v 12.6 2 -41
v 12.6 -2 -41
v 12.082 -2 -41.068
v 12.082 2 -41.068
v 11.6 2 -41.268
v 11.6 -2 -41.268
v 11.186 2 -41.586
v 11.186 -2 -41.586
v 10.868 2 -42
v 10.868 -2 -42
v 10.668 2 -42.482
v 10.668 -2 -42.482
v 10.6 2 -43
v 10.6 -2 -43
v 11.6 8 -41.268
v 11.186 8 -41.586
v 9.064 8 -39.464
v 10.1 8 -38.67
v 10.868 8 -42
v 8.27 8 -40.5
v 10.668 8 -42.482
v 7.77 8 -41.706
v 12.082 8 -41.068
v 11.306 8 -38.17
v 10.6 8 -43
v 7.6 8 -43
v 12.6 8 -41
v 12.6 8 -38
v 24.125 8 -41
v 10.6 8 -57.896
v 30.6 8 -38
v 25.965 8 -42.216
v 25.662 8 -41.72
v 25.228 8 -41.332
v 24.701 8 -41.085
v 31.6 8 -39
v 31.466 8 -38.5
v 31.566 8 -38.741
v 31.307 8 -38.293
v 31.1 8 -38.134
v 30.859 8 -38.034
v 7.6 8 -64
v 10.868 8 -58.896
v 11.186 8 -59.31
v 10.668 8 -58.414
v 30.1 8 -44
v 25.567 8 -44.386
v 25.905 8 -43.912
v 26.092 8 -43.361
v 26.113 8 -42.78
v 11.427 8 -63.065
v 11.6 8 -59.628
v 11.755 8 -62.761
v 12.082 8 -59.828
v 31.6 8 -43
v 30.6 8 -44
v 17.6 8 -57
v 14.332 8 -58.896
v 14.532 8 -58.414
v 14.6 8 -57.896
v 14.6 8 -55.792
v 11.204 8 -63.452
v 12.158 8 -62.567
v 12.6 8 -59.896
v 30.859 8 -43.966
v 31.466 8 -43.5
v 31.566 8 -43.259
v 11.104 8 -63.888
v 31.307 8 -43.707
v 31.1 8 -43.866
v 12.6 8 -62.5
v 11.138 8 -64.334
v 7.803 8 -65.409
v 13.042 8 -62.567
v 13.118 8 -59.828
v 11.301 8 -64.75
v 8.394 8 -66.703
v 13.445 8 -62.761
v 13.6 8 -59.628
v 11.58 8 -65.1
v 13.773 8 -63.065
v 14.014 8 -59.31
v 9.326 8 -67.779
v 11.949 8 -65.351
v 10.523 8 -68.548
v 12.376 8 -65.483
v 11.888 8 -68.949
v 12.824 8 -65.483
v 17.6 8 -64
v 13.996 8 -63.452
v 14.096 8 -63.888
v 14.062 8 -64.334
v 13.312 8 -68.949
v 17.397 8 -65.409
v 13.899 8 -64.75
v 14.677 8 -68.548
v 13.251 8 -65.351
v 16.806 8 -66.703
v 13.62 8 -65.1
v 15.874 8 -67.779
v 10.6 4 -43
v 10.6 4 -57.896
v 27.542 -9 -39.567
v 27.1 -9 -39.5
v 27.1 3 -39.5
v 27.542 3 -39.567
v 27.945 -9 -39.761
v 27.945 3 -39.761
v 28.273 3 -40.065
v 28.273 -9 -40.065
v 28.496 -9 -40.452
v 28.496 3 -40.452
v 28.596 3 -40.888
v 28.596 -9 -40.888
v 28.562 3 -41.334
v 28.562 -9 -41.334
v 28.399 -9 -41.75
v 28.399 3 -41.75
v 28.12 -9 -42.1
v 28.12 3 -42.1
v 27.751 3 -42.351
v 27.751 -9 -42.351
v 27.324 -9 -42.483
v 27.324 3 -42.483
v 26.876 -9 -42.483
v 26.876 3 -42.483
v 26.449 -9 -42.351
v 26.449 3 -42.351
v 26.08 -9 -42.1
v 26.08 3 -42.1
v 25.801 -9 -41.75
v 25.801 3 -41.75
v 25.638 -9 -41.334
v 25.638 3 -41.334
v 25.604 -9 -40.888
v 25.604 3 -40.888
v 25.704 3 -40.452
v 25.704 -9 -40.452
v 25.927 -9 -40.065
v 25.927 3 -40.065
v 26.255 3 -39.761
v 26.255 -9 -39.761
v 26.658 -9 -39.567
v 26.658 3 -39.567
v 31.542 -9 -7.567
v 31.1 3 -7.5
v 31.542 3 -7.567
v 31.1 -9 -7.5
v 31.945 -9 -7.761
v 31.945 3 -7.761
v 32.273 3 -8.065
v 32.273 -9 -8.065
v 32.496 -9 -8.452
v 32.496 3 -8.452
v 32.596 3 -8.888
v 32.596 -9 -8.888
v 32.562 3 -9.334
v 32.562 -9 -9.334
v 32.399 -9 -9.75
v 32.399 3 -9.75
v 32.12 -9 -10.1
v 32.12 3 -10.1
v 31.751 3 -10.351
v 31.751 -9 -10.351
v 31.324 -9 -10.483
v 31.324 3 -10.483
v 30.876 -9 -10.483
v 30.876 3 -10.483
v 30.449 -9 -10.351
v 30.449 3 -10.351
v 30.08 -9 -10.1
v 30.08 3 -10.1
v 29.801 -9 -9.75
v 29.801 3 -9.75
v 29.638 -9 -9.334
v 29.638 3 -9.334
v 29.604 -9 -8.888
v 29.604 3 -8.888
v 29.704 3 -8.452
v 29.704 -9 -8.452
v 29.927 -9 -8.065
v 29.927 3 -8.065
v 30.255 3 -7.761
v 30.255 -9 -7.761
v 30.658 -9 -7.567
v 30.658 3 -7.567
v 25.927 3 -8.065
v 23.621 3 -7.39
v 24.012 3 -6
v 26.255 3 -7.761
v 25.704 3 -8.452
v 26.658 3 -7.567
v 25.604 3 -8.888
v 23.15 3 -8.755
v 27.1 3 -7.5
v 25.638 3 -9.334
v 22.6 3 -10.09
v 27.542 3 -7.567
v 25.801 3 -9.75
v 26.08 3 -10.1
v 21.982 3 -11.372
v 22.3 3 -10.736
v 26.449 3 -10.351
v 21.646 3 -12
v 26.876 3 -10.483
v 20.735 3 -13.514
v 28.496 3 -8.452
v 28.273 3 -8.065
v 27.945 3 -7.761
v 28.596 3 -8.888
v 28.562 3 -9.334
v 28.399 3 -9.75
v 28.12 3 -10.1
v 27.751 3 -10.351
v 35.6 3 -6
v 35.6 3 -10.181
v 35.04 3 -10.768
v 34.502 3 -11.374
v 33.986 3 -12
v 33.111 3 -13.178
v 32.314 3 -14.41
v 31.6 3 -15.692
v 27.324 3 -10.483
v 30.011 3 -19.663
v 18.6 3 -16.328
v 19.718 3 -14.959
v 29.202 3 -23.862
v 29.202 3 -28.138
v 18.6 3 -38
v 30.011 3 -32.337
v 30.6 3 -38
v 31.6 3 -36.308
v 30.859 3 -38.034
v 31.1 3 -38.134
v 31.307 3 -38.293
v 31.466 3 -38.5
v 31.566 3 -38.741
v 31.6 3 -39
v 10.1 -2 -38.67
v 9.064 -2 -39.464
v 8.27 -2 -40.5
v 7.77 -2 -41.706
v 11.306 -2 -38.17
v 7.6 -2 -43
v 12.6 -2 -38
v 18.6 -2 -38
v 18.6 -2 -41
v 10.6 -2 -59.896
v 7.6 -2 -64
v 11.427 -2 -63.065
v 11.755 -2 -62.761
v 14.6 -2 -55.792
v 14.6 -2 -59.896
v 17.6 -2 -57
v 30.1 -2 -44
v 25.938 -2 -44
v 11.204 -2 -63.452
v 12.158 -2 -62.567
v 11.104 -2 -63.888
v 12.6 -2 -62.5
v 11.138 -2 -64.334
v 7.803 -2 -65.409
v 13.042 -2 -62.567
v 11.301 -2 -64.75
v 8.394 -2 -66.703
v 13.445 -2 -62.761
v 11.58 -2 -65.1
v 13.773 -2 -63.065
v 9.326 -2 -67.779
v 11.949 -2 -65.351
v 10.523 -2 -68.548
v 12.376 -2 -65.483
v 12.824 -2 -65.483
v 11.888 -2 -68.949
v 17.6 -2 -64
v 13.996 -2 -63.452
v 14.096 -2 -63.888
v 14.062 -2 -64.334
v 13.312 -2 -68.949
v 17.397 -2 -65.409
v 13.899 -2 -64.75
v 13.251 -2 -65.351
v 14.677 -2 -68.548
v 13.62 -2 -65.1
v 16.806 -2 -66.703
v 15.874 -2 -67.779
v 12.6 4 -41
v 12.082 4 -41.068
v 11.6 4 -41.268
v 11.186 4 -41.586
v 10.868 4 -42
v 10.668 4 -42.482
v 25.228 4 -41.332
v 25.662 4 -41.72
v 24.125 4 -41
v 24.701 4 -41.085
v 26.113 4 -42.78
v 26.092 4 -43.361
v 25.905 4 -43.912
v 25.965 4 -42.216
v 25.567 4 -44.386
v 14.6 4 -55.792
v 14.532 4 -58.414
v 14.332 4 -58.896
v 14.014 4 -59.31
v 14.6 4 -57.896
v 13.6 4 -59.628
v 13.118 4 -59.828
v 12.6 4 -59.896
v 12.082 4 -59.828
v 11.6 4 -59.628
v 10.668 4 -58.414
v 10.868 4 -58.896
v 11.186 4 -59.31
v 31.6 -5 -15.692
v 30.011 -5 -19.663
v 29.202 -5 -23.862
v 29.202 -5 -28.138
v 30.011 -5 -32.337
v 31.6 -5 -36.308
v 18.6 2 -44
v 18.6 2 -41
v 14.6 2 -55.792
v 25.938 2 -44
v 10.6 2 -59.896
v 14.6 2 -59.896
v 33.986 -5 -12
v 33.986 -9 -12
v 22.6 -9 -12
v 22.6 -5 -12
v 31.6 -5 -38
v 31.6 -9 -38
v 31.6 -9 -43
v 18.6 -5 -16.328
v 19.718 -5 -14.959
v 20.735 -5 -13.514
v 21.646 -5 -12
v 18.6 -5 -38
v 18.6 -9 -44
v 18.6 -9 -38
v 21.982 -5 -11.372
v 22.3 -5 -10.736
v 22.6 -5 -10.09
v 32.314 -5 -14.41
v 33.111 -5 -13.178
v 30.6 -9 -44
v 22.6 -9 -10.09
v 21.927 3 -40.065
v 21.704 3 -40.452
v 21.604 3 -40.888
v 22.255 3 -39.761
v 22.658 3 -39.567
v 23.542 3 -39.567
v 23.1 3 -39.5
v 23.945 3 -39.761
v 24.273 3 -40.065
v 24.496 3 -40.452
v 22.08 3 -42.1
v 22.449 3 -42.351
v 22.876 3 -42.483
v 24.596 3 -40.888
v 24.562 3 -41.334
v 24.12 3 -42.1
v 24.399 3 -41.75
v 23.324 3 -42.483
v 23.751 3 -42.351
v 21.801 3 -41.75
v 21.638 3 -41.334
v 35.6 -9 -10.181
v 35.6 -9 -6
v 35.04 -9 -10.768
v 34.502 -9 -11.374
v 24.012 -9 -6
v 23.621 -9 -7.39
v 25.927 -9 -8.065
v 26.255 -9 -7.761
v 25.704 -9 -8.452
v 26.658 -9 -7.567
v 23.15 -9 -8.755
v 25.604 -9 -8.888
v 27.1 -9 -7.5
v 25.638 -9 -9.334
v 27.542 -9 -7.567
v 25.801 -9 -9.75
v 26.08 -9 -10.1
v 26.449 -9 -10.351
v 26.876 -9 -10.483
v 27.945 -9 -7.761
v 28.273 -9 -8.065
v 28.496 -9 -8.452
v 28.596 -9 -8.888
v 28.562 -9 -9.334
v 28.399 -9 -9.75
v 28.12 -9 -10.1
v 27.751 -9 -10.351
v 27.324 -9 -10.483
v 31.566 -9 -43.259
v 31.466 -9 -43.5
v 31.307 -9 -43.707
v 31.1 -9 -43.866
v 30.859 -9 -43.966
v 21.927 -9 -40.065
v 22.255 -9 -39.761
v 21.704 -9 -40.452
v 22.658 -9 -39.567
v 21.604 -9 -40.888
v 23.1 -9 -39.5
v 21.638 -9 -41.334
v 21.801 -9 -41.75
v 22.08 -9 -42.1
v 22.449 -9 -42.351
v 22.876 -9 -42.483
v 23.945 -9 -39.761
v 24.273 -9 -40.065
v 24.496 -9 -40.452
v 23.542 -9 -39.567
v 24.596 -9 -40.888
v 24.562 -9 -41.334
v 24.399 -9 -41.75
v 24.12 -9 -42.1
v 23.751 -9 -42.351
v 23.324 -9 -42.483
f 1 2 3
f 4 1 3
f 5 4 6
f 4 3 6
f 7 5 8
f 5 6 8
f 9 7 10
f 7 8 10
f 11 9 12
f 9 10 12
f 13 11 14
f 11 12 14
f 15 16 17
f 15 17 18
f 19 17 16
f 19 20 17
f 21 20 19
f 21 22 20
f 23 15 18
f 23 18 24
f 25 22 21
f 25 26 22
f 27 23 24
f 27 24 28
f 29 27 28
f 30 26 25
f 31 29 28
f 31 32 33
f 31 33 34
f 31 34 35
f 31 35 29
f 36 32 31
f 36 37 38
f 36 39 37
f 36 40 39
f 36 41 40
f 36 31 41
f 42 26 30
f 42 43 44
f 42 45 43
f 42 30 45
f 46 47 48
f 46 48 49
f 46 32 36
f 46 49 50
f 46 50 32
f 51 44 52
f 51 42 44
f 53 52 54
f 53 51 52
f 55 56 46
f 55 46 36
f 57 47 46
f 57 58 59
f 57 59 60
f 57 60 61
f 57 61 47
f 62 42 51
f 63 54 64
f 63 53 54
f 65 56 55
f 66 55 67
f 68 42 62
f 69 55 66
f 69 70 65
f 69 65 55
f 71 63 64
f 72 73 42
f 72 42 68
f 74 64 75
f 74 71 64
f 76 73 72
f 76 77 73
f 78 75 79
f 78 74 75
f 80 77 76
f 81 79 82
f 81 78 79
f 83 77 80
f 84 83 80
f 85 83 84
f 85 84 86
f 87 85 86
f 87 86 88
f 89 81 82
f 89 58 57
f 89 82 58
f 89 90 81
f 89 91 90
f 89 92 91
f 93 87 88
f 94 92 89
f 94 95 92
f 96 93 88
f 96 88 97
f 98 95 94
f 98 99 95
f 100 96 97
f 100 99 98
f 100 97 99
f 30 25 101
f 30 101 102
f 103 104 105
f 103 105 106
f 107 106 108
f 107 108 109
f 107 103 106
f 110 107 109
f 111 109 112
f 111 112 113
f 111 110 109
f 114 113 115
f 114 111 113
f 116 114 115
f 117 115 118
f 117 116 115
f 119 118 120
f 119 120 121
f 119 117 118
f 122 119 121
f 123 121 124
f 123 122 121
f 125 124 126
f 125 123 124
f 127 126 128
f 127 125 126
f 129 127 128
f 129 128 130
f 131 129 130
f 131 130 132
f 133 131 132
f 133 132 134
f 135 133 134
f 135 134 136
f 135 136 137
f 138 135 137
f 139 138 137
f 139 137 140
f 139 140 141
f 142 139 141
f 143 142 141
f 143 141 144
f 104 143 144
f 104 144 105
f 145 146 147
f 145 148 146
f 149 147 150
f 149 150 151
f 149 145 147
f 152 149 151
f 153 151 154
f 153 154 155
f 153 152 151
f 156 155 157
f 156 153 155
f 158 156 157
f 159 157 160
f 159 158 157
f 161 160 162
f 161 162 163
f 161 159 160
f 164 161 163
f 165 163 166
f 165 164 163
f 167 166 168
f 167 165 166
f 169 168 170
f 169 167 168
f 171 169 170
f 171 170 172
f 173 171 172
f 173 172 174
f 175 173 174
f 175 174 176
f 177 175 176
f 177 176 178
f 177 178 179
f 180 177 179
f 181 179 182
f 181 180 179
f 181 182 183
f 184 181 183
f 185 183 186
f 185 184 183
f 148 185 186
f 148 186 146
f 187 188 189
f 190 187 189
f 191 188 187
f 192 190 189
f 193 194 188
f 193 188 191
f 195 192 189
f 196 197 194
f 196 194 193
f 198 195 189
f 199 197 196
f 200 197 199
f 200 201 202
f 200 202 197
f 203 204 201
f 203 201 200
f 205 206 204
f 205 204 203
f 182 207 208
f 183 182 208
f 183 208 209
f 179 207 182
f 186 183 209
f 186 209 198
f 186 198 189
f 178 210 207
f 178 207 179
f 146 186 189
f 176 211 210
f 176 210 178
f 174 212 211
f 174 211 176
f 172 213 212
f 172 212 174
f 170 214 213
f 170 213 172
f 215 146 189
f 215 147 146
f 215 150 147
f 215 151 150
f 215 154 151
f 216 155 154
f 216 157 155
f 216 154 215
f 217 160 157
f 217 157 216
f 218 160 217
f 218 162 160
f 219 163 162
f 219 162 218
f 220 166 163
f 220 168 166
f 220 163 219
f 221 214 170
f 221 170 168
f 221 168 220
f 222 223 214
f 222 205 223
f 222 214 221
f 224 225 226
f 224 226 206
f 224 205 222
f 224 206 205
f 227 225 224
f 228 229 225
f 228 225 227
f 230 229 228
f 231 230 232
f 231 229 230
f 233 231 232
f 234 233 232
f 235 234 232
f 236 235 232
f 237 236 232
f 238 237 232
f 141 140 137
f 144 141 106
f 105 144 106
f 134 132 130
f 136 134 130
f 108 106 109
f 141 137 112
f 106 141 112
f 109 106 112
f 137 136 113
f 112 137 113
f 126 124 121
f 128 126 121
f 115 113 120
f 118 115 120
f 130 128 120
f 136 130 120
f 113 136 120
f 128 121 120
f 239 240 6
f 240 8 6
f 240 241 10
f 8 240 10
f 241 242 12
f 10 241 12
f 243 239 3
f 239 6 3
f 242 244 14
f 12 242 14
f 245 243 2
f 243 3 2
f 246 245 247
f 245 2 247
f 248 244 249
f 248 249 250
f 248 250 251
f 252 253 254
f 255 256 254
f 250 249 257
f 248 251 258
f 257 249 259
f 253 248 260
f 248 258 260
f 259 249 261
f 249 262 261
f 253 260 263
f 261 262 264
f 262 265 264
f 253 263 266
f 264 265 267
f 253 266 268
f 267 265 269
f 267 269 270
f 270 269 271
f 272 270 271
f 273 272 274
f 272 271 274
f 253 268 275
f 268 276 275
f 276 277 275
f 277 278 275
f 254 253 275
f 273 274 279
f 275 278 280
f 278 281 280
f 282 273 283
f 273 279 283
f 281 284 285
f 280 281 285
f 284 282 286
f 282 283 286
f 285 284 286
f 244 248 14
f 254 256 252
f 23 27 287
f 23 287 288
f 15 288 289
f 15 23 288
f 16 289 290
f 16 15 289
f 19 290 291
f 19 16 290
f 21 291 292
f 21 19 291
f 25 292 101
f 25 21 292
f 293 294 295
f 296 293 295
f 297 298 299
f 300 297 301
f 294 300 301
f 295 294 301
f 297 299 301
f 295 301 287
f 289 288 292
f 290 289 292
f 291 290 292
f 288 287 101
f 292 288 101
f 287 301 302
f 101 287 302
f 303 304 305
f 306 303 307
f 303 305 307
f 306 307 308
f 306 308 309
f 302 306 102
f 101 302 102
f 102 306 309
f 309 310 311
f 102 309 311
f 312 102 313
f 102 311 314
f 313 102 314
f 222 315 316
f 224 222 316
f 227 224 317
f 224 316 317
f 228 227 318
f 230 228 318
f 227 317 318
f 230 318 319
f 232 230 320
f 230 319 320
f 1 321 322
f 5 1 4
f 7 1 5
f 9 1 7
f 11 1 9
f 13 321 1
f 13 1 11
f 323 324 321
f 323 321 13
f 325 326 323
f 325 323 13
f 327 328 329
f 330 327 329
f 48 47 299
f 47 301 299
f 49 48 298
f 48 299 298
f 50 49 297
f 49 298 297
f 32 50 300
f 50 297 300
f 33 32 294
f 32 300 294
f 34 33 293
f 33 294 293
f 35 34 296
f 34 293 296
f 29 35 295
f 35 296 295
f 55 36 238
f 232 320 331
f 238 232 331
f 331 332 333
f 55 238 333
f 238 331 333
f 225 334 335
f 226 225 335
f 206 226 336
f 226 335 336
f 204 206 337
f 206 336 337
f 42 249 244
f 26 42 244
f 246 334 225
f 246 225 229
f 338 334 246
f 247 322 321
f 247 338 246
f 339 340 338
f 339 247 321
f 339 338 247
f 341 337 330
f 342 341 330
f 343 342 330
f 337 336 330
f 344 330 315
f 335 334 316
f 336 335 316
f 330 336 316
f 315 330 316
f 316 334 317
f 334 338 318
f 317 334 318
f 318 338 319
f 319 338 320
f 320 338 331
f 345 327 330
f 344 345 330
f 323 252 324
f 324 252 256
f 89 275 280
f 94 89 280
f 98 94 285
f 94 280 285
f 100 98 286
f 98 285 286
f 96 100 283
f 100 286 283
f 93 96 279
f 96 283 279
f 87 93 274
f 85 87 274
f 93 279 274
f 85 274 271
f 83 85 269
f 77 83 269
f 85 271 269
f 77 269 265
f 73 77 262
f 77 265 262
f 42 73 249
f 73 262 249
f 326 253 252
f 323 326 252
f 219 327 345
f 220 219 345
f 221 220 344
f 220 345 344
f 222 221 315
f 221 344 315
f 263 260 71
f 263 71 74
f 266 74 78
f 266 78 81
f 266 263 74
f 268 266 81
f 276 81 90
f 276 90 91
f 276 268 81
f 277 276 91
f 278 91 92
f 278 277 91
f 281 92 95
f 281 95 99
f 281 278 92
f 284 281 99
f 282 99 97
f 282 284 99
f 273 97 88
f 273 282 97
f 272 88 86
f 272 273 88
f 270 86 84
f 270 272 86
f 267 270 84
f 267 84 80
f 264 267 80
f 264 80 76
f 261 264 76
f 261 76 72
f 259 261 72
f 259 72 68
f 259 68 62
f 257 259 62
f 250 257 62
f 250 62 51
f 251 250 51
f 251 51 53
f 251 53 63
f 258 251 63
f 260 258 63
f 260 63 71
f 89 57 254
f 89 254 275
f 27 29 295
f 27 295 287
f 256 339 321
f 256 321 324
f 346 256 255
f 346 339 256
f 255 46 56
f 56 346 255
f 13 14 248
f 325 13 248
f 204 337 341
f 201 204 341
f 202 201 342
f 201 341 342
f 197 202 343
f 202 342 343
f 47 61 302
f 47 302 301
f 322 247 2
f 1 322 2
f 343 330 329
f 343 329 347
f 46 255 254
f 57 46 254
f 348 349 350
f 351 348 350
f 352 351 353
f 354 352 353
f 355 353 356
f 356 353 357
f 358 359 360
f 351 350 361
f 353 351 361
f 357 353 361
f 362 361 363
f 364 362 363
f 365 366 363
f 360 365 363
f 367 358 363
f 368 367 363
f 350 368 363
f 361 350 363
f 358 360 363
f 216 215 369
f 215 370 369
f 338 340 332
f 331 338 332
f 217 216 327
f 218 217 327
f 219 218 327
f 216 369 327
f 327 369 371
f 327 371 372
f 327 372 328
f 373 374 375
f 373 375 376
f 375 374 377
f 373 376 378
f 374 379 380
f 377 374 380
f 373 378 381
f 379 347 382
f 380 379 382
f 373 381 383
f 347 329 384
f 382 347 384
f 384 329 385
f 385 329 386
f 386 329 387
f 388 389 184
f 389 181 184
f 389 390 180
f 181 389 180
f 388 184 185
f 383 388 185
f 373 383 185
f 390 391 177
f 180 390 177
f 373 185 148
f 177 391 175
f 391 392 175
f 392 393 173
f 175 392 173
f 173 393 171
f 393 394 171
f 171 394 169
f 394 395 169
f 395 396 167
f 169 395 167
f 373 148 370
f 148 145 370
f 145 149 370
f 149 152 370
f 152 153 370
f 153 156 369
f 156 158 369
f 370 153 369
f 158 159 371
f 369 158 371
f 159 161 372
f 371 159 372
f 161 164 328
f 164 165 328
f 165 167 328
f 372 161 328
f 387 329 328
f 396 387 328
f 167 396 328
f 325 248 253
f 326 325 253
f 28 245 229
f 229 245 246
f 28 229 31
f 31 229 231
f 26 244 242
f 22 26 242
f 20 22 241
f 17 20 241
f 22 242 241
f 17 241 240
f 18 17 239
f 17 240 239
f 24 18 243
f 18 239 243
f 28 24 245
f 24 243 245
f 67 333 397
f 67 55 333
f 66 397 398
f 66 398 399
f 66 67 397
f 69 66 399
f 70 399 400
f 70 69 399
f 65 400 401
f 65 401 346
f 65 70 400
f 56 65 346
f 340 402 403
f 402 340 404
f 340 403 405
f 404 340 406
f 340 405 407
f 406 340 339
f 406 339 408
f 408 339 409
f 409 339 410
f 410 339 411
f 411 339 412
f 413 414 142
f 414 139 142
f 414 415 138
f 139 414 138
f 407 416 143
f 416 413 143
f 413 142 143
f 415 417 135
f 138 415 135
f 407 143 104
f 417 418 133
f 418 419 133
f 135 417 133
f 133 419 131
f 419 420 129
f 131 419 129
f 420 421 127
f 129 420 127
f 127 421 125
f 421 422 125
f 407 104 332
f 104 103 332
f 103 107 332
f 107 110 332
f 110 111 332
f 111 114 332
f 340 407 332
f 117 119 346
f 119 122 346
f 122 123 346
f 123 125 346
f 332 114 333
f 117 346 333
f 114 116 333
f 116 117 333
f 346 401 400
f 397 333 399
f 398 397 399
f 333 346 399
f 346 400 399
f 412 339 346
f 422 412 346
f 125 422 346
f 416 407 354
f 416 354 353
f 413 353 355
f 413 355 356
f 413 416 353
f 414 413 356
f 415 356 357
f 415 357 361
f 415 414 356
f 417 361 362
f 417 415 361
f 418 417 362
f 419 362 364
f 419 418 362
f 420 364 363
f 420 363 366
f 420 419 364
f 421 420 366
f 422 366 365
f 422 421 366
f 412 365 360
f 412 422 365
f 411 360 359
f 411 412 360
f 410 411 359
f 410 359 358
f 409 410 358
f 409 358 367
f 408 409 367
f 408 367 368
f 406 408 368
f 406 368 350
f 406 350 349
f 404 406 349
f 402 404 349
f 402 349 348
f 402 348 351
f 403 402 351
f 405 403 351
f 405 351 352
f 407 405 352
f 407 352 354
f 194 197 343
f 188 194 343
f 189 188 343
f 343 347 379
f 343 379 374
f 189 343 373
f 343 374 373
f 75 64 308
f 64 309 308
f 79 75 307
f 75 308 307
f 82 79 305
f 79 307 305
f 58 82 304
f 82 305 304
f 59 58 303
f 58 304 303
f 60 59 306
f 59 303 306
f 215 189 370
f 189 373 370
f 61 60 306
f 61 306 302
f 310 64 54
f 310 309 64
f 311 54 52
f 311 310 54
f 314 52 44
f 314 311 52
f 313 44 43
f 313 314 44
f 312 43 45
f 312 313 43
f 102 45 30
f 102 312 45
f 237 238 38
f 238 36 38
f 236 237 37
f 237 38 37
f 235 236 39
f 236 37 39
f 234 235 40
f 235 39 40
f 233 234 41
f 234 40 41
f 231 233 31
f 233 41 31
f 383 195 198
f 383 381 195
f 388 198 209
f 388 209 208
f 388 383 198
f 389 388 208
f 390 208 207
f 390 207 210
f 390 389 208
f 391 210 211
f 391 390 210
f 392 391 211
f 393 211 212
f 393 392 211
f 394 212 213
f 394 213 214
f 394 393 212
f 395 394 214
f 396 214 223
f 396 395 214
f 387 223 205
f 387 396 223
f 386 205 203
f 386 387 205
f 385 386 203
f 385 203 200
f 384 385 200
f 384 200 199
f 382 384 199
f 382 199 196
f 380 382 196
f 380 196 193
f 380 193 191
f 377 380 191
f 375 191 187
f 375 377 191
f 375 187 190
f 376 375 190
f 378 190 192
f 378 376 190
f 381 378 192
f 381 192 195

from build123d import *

# Parameters (mm, degrees)
SKETCH1_W             = 13
SKETCH1_H             = 6
SKETCH1_R             = 1.5
BOSS_EXTRUDE1_DEPTH   = 4
BOSS_EXTRUDE1_2_DEPTH = 4
BOSS_EXTRUDE2_START   = 4
SKETCH1_4_R           = 1.5
SKETCH1_4_W           = 13
SKETCH1_4_H           = 6
BOSS_EXTRUDE2_DEPTH   = 8
SKETCH2_R             = 1.5
BOSS_EXTRUDE3_DEPTH   = 5
BOSS_EXTRUDE4_START   = -5
SKETCH2_3_R           = 1.5
BOSS_EXTRUDE4_DEPTH   = 5
CUT_EXTRUDE1_DEPTH    = 4
FILLET1_R             = 1
FILLET2_R             = 1
FILLET3_R             = 2
BOSS_EXTRUDE5_START   = 11
SKETCH4_R             = 1.5
BOSS_EXTRUDE5_DEPTH   = 11


with BuildPart() as part:
    # Sketch1 → Boss-Extrude1 (new body)
    with BuildSketch(Plane(origin=(0, -9, 0), x_dir=(1, 0, 0), z_dir=(0, 1, 0))):
        with Locations((25.1, 41)):
            Rectangle(SKETCH1_W, SKETCH1_H)
        with Locations(Location((27.1, 41, 0), (0, 0, 270))):
            Circle(SKETCH1_R, mode=Mode.SUBTRACT)
        with Locations(Location((23.1, 41, 0), (0, 0, 270))):
            Circle(SKETCH1_R, mode=Mode.SUBTRACT)
    extrude(amount=BOSS_EXTRUDE1_DEPTH)



with BuildPart() as body_2:
    # Sketch1 → Boss-Extrude1 2 (new body)
    with BuildSketch(Plane(origin=(0, -9, 0), x_dir=(1, 0, 0), z_dir=(0, 1, 0))):
        with BuildLine():
            ThreePointArc((22.6, 10.089722494), (23.395394249, 8.075767946), (24.01171589, 6))
            Line((24.01171589, 6), (35.6, 6))
            Line((35.6, 6), (35.6, 10.18070798))
            ThreePointArc((35.6, 10.18070798), (34.768444056, 11.068532406), (33.986085046, 12))
            Line((33.986085046, 12), (31.6, 12))
            Line((31.6, 12), (22.6, 12))
            Line((22.6, 12), (22.6, 10.089722494))
        make_face()
        with Locations(Location((27.1, 9, 0), (0, 0, 270))):
            Circle(SKETCH1_R, mode=Mode.SUBTRACT)
        with Locations(Location((31.1, 9, 0), (0, 0, 270))):
            Circle(SKETCH1_R, mode=Mode.SUBTRACT)
    extrude(amount=BOSS_EXTRUDE1_2_DEPTH)


with BuildPart() as part_1:
    add(part.part)

    add(body_2.part)  # Boss-Extrude2 merges body 2
    # Sketch1<4> → Boss-Extrude2 (add)
    # profile 1 of 5: a face of its own
    with BuildSketch(Plane(origin=(0, -9, 0), x_dir=(1, 0, 0), z_dir=(0, 1, 0)).offset(BOSS_EXTRUDE2_START)):
        with BuildLine():
            ThreePointArc((22.6, 10.089722494), (23.395394249, 8.075767946), (24.01171589, 6))
            Line((24.01171589, 6), (35.6, 6))
            Line((35.6, 6), (35.6, 10.18070798))
            ThreePointArc((35.6, 10.18070798), (34.768444056, 11.068532406), (33.986085046, 12))
            Line((33.986085046, 12), (31.6, 12))
            Line((31.6, 12), (22.6, 12))
            Line((22.6, 12), (22.6, 10.089722494))
        make_face()
        with Locations(Location((27.1, 9, 0), (0, 0, 270))):
            Circle(SKETCH1_4_R, mode=Mode.SUBTRACT)
        with Locations(Location((31.1, 9, 0), (0, 0, 270))):
            Circle(SKETCH1_4_R, mode=Mode.SUBTRACT)
    # profile 2 of 5: a face of its own
    with BuildSketch(Plane(origin=(0, -9, 0), x_dir=(1, 0, 0), z_dir=(0, 1, 0)).offset(BOSS_EXTRUDE2_START)):
        with BuildLine():
            Line((21.646304534, 12), (22.6, 12))
            Line((22.6, 12), (31.6, 12))
            Line((31.6, 12), (31.6, 15.692235936))
            ThreePointArc((31.6, 15.692235936), (29.1, 26), (31.6, 36.307764064))
            Line((31.6, 36.307764064), (31.6, 38))
            Line((31.6, 38), (18.6, 38))
            Line((18.6, 38), (18.6, 16.327966805))
            ThreePointArc((18.6, 16.327966805), (20.239171953, 14.245645604), (21.646304534, 12))
        make_face()
    # profile 3 of 5: a face of its own
    with BuildSketch(Plane(origin=(0, -9, 0), x_dir=(1, 0, 0), z_dir=(0, 1, 0)).offset(BOSS_EXTRUDE2_START)):
        with BuildLine():
            Line((31.6, 15.692235936), (31.6, 12))
            Line((31.6, 12), (33.986085046, 12))
            ThreePointArc((33.986085046, 12), (32.702650951, 13.787702963), (31.6, 15.692235936))
        make_face()
    # profile 4 of 5: a face of its own
    with BuildSketch(Plane(origin=(0, -9, 0), x_dir=(1, 0, 0), z_dir=(0, 1, 0)).offset(BOSS_EXTRUDE2_START)):
        with BuildLine():
            ThreePointArc((21.646304534, 12), (22.143761114, 11.055150099), (22.6, 10.089722494))
            Line((22.6, 10.089722494), (22.6, 12))
            Line((22.6, 12), (21.646304534, 12))
        make_face()
    # profile 5 of 5: a face of its own
    with BuildSketch(Plane(origin=(0, -9, 0), x_dir=(1, 0, 0), z_dir=(0, 1, 0)).offset(BOSS_EXTRUDE2_START)):
        with Locations((25.1, 41)):
            Rectangle(SKETCH1_4_W, SKETCH1_4_H)
        with Locations(Location((27.1, 41, 0), (0, 0, 270))):
            Circle(SKETCH1_4_R, mode=Mode.SUBTRACT)
        with Locations(Location((23.1, 41, 0), (0, 0, 270))):
            Circle(SKETCH1_4_R, mode=Mode.SUBTRACT)
    extrude(amount=BOSS_EXTRUDE2_DEPTH)

    # Sketch2 → Boss-Extrude3 (add)
    with BuildSketch(Plane(origin=(0, 3, 0), x_dir=(1, 0, 0), z_dir=(0, 1, 0))):
        with BuildLine():
            Line((31.6, 38), (31.6, 44))
            Line((31.6, 44), (30.1, 44))
            Line((30.1, 44), (17.6, 57))
            Line((17.6, 57), (17.6, 64))
            ThreePointArc((17.6, 64), (12.6, 69), (7.6, 64))
            Line((7.6, 64), (7.6, 43))
            ThreePointArc((7.6, 43), (9.064466094, 39.464466094), (12.6, 38))
            Line((12.6, 38), (31.6, 38))
        make_face()
        with Locations(Location((12.6, 64, 0), (0, 0, 270))):
            Circle(SKETCH2_R, mode=Mode.SUBTRACT)
    extrude(amount=BOSS_EXTRUDE3_DEPTH)

    # Sketch2<3> → Boss-Extrude4 (add)
    with BuildSketch(Plane(origin=(0, 3, 0), x_dir=(1, 0, 0), z_dir=(0, 1, 0)).offset(BOSS_EXTRUDE4_START)):
        with BuildLine():
            Line((18.6, 38), (18.6, 44))
            Line((18.6, 44), (30.1, 44))
            Line((30.1, 44), (17.6, 57))
            Line((17.6, 57), (17.6, 64))
            ThreePointArc((17.6, 64), (12.6, 69), (7.6, 64))
            Line((7.6, 64), (7.6, 43))
            ThreePointArc((7.6, 43), (9.064466094, 39.464466094), (12.6, 38))
            Line((12.6, 38), (18.6, 38))
        make_face()
        with Locations(Location((12.6, 64, 0), (0, 0, 270))):
            Circle(SKETCH2_3_R, mode=Mode.SUBTRACT)
    extrude(amount=BOSS_EXTRUDE4_DEPTH)

    # Sketch3 → Cut-Extrude1 (cut)
    with BuildSketch(Plane(origin=(0, 8, 0), x_dir=(1, 0, 0), z_dir=(0, 1, 0))):
        with BuildLine():
            Line((10.6, 59.895837344), (14.6, 59.895837344))
            Line((14.6, 59.895837344), (14.6, 55.791674689))
            Line((14.6, 55.791674689), (28.822764124, 41))
            Line((28.822764124, 41), (12.6, 41))
            ThreePointArc((12.6, 41), (11.185786438, 41.585786438), (10.6, 43))
            Line((10.6, 43), (10.6, 59.895837344))
        make_face()
    cut_extrude1 = extrude(amount=-CUT_EXTRUDE1_DEPTH, mode=Mode.SUBTRACT)

    # Fillet1
    fillet1_edges = [part_1.edges().sort_by_distance(p)[0] for p in [
        (31.6, -0.5, -44),
    ]]
    fillet(fillet1_edges, radius=FILLET1_R)

    # Fillet2
    fillet2_edges = [part_1.edges().sort_by_distance(p)[0] for p in [
        (31.6, 5.5, -38),
    ]]
    fillet(fillet2_edges, radius=FILLET2_R)

    # Fillet3
    fillet3_edges = [part_1.edges().sort_by_distance(p)[0] for p in [
        (14.6, 6, -59.895837344),
        (10.6, 6, -59.895837344),
        (28.822764124, 6, -41),
    ]]
    fillet(fillet3_edges, radius=FILLET3_R - 0.0001)  # a hair under: the kernel refuses the full size

    # Mirror2: Cut-Extrude1 across plane
    add(cut_extrude1.mirror(Plane.ZX.offset(3)), mode=Mode.SUBTRACT)

    # Sketch4 → Boss-Extrude5 (add)
    with BuildSketch(Plane.XZ.offset(-2).offset(BOSS_EXTRUDE5_START)):
        with BuildLine():
            Line((18.6, -44), (30.6, -44))
            ThreePointArc((30.6, -44), (31.307106781, -43.707106781), (31.6, -43))
            Line((31.6, -43), (31.6, -38))
            Line((31.6, -38), (18.6, -38))
            Line((18.6, -38), (18.6, -44))
        make_face()
        with Locations(Location((23.1, -41, 0), (0, 0, 90))):
            Circle(SKETCH4_R, mode=Mode.SUBTRACT)
        with Locations(Location((27.1, -41, 0), (0, 0, 90))):
            Circle(SKETCH4_R, mode=Mode.SUBTRACT)
    extrude(amount=-BOSS_EXTRUDE5_DEPTH)


solid = part_1.part
